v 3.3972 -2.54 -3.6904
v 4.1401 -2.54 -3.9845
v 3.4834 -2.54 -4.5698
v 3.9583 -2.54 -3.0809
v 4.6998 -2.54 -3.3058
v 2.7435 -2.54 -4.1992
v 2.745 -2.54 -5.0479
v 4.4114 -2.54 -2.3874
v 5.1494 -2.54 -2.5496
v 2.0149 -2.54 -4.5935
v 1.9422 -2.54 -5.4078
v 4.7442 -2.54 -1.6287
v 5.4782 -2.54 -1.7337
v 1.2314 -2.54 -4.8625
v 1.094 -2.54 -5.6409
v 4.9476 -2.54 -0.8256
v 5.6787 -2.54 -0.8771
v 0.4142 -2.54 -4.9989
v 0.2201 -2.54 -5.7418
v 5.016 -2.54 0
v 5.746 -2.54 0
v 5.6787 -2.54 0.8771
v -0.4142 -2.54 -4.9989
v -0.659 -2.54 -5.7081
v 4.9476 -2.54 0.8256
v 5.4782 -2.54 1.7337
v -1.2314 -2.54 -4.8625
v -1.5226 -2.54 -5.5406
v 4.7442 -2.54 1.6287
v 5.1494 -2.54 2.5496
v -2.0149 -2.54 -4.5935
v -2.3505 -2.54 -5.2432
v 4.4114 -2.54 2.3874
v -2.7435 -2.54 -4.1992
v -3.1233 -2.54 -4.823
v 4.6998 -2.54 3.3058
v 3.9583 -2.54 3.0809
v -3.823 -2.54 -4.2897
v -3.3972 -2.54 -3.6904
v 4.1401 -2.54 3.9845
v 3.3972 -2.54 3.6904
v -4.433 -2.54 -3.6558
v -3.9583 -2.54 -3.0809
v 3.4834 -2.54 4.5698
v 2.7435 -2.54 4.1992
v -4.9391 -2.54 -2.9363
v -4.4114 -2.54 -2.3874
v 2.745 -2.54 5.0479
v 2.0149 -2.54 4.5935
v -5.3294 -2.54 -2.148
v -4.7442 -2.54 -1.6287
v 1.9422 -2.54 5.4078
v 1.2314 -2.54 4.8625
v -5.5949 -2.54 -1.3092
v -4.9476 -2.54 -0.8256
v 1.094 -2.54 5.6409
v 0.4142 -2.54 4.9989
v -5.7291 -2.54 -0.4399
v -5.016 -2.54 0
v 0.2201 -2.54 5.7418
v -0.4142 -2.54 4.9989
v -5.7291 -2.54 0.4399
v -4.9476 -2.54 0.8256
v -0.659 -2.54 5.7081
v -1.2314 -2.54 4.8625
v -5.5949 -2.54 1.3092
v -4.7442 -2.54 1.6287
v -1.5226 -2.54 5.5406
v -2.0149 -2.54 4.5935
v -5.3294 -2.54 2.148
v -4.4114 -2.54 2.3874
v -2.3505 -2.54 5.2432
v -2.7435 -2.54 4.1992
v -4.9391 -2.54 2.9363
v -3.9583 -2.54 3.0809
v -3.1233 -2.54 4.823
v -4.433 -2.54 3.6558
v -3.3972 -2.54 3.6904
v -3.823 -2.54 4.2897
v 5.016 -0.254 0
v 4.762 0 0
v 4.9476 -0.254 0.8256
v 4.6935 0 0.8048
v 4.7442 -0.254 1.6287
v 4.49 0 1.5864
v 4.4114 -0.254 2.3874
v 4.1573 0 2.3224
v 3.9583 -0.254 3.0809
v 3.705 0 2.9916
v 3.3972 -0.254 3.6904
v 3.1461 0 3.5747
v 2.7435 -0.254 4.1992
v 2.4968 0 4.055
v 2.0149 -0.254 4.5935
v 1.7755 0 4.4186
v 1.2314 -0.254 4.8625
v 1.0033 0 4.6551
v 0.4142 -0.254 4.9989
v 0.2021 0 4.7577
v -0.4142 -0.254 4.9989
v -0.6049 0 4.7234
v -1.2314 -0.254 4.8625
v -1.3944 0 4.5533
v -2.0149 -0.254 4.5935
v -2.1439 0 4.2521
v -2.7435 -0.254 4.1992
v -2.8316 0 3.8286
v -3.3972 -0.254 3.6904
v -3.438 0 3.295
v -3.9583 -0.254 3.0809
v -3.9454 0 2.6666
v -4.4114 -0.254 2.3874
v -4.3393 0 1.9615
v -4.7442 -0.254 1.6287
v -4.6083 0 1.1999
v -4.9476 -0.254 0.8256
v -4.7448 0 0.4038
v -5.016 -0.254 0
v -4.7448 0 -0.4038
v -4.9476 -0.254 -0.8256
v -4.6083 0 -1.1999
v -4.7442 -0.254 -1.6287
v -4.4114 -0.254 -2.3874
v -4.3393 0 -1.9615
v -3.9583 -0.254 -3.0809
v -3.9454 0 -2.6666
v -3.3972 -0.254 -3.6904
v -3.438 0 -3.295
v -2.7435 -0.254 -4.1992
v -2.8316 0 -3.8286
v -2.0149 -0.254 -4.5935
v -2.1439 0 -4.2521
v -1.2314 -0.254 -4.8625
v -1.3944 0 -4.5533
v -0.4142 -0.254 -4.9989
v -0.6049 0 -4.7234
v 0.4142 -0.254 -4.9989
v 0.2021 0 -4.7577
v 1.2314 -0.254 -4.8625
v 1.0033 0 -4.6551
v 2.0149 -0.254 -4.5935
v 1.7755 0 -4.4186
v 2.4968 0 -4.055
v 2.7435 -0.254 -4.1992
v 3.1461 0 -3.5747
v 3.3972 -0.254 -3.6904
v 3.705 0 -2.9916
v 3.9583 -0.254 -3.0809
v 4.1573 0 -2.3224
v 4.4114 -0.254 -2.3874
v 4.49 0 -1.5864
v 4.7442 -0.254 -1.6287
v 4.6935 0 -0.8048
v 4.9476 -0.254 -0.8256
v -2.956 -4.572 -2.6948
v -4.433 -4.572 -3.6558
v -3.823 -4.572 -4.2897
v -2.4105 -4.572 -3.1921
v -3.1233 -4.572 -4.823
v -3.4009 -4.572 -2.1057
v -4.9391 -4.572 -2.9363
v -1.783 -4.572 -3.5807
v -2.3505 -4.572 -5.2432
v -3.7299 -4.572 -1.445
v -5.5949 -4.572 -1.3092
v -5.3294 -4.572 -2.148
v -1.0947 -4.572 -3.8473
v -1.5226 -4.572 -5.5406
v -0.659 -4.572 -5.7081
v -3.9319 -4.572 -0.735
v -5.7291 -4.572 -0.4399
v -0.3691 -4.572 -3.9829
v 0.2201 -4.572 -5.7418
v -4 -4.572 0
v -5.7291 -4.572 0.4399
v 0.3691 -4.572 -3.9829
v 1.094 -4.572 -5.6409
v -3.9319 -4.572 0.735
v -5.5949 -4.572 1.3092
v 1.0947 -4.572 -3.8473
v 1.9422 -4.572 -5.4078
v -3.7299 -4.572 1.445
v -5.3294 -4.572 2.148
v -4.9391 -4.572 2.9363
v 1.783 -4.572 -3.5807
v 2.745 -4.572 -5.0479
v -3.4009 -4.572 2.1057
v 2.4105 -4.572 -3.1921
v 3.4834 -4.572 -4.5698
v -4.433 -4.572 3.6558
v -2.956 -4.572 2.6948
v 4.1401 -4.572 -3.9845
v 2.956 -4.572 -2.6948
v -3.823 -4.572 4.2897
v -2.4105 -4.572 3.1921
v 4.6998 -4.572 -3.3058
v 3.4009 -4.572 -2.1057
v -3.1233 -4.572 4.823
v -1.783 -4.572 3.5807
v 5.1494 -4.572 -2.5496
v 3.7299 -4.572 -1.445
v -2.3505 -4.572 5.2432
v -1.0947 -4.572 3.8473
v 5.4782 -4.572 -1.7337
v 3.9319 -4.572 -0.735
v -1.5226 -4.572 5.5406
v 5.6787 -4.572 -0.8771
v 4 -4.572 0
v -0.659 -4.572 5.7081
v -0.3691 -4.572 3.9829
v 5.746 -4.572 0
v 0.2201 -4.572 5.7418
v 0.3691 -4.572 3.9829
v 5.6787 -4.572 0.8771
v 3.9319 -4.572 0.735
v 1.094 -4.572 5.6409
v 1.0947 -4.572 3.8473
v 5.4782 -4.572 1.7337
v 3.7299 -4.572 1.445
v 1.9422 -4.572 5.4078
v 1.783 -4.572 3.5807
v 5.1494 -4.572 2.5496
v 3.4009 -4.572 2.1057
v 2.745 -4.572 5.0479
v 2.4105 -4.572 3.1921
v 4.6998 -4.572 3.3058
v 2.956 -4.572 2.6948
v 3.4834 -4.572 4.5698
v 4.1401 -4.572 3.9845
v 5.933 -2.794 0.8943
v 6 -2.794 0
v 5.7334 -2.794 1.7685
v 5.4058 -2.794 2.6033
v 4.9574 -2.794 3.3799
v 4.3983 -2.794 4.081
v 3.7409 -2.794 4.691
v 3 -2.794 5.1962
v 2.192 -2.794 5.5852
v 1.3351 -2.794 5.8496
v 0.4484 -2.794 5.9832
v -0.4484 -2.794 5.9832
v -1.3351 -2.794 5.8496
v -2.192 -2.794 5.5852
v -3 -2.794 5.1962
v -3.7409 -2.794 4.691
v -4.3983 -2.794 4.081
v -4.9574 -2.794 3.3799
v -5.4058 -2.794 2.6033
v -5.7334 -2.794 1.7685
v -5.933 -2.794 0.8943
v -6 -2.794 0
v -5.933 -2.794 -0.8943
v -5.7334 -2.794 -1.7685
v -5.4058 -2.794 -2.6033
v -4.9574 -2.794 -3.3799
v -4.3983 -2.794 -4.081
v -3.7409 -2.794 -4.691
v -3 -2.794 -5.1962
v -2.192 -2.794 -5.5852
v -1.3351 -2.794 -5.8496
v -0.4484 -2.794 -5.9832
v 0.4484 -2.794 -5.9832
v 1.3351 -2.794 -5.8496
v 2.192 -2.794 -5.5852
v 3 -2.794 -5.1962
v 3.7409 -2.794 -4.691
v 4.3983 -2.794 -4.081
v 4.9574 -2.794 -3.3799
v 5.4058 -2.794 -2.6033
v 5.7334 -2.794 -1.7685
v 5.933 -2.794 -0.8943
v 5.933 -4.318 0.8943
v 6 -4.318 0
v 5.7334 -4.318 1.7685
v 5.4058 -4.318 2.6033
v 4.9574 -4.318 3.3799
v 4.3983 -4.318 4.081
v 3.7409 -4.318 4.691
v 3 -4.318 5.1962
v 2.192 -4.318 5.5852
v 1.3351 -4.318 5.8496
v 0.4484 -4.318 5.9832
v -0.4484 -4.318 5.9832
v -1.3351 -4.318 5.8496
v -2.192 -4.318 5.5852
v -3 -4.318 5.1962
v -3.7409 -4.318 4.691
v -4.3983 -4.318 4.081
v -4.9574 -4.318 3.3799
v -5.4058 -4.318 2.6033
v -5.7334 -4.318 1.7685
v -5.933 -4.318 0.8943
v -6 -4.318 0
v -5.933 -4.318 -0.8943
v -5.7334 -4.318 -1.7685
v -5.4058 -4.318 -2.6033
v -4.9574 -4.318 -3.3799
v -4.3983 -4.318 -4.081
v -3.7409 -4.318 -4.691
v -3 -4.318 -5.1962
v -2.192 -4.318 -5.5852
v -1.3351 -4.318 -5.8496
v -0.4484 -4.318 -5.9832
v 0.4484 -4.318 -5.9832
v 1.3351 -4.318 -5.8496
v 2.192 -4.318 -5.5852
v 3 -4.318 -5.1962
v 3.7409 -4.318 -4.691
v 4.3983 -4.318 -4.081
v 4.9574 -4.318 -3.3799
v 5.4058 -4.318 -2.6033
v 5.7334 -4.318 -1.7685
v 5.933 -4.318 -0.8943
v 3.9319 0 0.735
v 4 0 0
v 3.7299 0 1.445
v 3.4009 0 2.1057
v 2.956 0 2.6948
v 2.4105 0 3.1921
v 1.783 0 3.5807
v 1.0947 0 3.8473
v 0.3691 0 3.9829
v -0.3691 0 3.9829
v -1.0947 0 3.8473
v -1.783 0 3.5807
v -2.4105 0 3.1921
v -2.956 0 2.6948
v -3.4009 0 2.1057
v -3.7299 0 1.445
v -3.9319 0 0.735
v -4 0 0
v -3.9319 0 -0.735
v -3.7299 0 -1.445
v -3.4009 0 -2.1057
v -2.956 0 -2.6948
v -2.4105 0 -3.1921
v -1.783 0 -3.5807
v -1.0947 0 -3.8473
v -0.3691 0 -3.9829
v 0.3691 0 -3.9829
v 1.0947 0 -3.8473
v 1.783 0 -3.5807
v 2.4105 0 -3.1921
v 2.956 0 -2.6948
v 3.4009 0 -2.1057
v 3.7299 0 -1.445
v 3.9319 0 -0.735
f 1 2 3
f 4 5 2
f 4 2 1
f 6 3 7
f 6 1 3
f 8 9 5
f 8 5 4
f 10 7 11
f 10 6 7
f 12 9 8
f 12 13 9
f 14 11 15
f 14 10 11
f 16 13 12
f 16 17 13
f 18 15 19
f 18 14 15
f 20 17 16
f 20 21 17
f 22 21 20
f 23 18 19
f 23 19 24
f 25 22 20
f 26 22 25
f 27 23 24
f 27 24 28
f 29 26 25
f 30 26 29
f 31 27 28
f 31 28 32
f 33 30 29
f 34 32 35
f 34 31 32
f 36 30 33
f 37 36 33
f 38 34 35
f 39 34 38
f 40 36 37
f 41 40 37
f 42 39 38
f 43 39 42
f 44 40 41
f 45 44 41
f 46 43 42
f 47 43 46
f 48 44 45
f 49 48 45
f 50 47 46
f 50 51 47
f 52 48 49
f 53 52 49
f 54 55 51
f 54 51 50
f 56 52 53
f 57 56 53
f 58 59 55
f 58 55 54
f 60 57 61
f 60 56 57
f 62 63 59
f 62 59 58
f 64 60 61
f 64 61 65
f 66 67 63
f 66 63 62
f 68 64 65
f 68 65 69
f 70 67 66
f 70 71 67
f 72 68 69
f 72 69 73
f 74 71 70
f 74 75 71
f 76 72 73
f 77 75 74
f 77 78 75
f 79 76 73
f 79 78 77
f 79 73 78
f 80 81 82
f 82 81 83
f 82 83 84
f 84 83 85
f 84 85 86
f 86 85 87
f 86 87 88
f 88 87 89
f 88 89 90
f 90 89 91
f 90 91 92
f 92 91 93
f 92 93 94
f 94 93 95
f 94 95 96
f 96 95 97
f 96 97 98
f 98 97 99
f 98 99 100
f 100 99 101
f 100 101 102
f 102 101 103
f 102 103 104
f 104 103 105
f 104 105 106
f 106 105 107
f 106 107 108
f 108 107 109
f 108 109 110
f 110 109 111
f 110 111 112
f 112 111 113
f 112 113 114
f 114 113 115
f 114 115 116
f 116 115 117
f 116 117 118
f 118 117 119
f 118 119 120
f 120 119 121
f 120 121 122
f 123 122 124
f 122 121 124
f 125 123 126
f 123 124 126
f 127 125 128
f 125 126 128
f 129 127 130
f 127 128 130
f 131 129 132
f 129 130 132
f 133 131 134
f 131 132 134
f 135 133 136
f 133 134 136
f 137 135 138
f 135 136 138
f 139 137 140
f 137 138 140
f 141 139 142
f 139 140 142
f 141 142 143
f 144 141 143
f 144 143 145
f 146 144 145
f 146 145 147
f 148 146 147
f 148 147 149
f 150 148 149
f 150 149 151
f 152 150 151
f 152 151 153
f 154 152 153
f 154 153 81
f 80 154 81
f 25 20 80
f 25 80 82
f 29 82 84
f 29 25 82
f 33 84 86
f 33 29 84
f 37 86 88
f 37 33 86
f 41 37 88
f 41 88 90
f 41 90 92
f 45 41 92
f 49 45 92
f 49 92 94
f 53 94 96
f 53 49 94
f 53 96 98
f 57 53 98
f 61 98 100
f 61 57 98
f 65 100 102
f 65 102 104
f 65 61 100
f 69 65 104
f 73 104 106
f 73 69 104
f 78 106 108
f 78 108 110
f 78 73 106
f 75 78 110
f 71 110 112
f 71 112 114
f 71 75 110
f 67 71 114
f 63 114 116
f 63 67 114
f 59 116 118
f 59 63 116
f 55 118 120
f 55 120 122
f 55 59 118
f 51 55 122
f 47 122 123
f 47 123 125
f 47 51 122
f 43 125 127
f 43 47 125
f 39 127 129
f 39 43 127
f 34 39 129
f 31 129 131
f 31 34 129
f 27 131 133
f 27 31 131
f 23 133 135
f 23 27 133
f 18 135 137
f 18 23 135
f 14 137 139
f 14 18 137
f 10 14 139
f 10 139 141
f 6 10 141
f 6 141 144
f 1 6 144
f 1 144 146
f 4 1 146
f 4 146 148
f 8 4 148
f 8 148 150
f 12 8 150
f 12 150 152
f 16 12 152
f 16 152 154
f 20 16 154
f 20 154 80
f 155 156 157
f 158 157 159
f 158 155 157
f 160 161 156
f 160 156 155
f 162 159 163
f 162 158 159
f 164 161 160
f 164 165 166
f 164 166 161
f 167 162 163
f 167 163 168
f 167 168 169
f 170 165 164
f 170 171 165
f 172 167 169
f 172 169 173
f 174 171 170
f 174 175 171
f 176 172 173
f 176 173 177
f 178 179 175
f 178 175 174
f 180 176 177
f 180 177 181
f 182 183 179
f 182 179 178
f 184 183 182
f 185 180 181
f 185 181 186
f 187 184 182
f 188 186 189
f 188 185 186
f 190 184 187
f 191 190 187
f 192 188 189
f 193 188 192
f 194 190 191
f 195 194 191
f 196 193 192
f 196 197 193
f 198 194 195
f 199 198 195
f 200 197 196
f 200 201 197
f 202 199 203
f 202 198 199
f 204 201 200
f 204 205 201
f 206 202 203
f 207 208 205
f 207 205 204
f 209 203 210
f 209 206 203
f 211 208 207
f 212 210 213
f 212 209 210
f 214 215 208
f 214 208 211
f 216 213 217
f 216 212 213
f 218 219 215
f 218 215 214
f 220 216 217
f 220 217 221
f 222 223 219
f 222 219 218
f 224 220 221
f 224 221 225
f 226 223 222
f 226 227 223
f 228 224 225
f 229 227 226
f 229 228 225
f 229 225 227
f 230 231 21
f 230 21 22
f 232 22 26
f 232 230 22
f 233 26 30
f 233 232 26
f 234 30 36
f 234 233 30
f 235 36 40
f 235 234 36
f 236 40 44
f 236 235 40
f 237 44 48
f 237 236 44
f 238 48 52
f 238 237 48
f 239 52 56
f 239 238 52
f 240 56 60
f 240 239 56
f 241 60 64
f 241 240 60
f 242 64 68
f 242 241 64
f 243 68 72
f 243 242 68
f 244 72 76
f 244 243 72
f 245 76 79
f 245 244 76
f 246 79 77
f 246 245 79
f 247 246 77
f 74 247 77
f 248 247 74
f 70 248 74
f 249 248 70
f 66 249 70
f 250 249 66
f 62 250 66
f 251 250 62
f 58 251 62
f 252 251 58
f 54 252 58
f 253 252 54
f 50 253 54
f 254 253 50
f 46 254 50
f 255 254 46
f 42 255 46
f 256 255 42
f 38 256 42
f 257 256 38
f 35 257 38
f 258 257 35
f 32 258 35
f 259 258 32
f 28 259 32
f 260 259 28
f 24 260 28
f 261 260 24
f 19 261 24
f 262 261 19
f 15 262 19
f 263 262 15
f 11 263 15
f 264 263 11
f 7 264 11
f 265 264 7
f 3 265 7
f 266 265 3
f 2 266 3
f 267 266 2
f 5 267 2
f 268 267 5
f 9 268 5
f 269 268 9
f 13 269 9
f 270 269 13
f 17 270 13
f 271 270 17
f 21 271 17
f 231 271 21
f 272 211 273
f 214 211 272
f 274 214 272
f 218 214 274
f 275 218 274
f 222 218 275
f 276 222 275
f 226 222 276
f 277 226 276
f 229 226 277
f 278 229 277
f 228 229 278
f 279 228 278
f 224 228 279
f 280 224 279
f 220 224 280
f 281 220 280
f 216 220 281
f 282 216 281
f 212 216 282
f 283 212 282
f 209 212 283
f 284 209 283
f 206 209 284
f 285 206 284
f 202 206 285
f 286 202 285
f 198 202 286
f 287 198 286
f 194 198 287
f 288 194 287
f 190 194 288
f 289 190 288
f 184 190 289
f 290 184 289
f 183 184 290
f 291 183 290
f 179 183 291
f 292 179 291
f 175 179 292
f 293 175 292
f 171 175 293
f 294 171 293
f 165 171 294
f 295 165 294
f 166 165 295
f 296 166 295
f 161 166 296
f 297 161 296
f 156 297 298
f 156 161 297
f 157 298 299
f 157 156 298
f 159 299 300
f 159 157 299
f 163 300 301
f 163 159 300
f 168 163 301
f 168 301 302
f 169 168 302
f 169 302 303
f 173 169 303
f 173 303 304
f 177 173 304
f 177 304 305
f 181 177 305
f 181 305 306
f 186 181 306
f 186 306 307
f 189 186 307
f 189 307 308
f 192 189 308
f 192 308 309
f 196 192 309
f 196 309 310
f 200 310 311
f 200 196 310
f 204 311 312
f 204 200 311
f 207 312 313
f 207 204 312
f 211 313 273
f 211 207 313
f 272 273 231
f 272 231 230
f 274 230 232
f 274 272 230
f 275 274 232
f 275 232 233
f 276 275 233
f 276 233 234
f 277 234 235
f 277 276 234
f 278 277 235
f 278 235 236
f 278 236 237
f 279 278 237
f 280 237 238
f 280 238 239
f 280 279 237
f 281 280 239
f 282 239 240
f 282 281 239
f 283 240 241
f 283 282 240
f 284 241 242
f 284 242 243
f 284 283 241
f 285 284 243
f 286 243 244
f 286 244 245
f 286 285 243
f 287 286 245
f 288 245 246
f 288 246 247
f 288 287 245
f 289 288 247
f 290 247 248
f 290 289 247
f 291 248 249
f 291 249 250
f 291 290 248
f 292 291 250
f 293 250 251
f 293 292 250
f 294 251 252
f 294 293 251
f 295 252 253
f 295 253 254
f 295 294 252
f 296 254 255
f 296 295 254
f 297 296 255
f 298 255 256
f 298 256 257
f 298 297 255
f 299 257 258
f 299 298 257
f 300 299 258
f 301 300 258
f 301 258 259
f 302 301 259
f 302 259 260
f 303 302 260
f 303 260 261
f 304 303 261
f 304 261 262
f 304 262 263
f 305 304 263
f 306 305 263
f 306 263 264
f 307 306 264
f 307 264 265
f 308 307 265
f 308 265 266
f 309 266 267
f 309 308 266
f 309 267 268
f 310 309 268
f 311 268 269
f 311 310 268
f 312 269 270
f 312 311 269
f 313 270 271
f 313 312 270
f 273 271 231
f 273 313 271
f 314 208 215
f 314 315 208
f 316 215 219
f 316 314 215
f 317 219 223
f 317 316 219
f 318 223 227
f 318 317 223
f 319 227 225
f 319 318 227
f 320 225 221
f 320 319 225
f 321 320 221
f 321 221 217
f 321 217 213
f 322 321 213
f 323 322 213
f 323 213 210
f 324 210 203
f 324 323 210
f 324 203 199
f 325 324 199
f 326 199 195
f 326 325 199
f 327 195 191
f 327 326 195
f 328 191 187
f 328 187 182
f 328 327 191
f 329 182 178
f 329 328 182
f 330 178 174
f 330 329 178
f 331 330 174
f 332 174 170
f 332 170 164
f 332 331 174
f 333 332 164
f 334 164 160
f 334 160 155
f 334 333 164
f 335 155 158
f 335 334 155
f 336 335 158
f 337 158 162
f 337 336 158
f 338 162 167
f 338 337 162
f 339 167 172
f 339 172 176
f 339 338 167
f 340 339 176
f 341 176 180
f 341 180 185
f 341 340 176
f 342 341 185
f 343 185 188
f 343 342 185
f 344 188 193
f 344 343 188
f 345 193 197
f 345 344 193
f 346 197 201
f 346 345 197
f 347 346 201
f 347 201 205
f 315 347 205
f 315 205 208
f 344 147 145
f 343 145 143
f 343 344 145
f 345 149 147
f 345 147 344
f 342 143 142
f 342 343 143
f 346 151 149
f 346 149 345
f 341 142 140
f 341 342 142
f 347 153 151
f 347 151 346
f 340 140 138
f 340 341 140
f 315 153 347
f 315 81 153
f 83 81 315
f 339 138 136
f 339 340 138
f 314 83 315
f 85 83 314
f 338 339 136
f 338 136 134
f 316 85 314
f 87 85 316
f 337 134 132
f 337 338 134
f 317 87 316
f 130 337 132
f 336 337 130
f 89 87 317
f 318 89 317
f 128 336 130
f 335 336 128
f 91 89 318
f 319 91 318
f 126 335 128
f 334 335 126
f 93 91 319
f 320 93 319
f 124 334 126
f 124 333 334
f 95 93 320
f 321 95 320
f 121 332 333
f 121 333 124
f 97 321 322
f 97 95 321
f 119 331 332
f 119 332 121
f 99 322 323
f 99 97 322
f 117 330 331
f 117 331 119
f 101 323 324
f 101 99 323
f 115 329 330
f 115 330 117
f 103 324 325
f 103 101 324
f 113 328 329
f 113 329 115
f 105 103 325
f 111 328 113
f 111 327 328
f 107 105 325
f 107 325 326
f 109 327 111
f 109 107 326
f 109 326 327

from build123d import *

# Parameters (mm, degrees)
CHAMFER1_SIZE = 0.254


with BuildPart() as part:
    # Sketch1 → Revolve1 (revolve)
    with BuildSketch(Plane.XY):
        Polygon((5.016, 0), (5.016, -2.54), (6, -2.54), (6, -4.572), (4, -4.572), (4, 0), align=None)
    revolve(axis=Axis((0, 0, 0), (0, -1, 0)))

    # Chamfer1
    chamfer1_edges = [part.edges().sort_by_distance(p)[0] for p in [
        (-6, -4.572, 0),
        (-6, -2.54, 0),
        (-5.016, 0, 0),
    ]]
    chamfer(chamfer1_edges, length=CHAMFER1_SIZE)


solid = part.part
